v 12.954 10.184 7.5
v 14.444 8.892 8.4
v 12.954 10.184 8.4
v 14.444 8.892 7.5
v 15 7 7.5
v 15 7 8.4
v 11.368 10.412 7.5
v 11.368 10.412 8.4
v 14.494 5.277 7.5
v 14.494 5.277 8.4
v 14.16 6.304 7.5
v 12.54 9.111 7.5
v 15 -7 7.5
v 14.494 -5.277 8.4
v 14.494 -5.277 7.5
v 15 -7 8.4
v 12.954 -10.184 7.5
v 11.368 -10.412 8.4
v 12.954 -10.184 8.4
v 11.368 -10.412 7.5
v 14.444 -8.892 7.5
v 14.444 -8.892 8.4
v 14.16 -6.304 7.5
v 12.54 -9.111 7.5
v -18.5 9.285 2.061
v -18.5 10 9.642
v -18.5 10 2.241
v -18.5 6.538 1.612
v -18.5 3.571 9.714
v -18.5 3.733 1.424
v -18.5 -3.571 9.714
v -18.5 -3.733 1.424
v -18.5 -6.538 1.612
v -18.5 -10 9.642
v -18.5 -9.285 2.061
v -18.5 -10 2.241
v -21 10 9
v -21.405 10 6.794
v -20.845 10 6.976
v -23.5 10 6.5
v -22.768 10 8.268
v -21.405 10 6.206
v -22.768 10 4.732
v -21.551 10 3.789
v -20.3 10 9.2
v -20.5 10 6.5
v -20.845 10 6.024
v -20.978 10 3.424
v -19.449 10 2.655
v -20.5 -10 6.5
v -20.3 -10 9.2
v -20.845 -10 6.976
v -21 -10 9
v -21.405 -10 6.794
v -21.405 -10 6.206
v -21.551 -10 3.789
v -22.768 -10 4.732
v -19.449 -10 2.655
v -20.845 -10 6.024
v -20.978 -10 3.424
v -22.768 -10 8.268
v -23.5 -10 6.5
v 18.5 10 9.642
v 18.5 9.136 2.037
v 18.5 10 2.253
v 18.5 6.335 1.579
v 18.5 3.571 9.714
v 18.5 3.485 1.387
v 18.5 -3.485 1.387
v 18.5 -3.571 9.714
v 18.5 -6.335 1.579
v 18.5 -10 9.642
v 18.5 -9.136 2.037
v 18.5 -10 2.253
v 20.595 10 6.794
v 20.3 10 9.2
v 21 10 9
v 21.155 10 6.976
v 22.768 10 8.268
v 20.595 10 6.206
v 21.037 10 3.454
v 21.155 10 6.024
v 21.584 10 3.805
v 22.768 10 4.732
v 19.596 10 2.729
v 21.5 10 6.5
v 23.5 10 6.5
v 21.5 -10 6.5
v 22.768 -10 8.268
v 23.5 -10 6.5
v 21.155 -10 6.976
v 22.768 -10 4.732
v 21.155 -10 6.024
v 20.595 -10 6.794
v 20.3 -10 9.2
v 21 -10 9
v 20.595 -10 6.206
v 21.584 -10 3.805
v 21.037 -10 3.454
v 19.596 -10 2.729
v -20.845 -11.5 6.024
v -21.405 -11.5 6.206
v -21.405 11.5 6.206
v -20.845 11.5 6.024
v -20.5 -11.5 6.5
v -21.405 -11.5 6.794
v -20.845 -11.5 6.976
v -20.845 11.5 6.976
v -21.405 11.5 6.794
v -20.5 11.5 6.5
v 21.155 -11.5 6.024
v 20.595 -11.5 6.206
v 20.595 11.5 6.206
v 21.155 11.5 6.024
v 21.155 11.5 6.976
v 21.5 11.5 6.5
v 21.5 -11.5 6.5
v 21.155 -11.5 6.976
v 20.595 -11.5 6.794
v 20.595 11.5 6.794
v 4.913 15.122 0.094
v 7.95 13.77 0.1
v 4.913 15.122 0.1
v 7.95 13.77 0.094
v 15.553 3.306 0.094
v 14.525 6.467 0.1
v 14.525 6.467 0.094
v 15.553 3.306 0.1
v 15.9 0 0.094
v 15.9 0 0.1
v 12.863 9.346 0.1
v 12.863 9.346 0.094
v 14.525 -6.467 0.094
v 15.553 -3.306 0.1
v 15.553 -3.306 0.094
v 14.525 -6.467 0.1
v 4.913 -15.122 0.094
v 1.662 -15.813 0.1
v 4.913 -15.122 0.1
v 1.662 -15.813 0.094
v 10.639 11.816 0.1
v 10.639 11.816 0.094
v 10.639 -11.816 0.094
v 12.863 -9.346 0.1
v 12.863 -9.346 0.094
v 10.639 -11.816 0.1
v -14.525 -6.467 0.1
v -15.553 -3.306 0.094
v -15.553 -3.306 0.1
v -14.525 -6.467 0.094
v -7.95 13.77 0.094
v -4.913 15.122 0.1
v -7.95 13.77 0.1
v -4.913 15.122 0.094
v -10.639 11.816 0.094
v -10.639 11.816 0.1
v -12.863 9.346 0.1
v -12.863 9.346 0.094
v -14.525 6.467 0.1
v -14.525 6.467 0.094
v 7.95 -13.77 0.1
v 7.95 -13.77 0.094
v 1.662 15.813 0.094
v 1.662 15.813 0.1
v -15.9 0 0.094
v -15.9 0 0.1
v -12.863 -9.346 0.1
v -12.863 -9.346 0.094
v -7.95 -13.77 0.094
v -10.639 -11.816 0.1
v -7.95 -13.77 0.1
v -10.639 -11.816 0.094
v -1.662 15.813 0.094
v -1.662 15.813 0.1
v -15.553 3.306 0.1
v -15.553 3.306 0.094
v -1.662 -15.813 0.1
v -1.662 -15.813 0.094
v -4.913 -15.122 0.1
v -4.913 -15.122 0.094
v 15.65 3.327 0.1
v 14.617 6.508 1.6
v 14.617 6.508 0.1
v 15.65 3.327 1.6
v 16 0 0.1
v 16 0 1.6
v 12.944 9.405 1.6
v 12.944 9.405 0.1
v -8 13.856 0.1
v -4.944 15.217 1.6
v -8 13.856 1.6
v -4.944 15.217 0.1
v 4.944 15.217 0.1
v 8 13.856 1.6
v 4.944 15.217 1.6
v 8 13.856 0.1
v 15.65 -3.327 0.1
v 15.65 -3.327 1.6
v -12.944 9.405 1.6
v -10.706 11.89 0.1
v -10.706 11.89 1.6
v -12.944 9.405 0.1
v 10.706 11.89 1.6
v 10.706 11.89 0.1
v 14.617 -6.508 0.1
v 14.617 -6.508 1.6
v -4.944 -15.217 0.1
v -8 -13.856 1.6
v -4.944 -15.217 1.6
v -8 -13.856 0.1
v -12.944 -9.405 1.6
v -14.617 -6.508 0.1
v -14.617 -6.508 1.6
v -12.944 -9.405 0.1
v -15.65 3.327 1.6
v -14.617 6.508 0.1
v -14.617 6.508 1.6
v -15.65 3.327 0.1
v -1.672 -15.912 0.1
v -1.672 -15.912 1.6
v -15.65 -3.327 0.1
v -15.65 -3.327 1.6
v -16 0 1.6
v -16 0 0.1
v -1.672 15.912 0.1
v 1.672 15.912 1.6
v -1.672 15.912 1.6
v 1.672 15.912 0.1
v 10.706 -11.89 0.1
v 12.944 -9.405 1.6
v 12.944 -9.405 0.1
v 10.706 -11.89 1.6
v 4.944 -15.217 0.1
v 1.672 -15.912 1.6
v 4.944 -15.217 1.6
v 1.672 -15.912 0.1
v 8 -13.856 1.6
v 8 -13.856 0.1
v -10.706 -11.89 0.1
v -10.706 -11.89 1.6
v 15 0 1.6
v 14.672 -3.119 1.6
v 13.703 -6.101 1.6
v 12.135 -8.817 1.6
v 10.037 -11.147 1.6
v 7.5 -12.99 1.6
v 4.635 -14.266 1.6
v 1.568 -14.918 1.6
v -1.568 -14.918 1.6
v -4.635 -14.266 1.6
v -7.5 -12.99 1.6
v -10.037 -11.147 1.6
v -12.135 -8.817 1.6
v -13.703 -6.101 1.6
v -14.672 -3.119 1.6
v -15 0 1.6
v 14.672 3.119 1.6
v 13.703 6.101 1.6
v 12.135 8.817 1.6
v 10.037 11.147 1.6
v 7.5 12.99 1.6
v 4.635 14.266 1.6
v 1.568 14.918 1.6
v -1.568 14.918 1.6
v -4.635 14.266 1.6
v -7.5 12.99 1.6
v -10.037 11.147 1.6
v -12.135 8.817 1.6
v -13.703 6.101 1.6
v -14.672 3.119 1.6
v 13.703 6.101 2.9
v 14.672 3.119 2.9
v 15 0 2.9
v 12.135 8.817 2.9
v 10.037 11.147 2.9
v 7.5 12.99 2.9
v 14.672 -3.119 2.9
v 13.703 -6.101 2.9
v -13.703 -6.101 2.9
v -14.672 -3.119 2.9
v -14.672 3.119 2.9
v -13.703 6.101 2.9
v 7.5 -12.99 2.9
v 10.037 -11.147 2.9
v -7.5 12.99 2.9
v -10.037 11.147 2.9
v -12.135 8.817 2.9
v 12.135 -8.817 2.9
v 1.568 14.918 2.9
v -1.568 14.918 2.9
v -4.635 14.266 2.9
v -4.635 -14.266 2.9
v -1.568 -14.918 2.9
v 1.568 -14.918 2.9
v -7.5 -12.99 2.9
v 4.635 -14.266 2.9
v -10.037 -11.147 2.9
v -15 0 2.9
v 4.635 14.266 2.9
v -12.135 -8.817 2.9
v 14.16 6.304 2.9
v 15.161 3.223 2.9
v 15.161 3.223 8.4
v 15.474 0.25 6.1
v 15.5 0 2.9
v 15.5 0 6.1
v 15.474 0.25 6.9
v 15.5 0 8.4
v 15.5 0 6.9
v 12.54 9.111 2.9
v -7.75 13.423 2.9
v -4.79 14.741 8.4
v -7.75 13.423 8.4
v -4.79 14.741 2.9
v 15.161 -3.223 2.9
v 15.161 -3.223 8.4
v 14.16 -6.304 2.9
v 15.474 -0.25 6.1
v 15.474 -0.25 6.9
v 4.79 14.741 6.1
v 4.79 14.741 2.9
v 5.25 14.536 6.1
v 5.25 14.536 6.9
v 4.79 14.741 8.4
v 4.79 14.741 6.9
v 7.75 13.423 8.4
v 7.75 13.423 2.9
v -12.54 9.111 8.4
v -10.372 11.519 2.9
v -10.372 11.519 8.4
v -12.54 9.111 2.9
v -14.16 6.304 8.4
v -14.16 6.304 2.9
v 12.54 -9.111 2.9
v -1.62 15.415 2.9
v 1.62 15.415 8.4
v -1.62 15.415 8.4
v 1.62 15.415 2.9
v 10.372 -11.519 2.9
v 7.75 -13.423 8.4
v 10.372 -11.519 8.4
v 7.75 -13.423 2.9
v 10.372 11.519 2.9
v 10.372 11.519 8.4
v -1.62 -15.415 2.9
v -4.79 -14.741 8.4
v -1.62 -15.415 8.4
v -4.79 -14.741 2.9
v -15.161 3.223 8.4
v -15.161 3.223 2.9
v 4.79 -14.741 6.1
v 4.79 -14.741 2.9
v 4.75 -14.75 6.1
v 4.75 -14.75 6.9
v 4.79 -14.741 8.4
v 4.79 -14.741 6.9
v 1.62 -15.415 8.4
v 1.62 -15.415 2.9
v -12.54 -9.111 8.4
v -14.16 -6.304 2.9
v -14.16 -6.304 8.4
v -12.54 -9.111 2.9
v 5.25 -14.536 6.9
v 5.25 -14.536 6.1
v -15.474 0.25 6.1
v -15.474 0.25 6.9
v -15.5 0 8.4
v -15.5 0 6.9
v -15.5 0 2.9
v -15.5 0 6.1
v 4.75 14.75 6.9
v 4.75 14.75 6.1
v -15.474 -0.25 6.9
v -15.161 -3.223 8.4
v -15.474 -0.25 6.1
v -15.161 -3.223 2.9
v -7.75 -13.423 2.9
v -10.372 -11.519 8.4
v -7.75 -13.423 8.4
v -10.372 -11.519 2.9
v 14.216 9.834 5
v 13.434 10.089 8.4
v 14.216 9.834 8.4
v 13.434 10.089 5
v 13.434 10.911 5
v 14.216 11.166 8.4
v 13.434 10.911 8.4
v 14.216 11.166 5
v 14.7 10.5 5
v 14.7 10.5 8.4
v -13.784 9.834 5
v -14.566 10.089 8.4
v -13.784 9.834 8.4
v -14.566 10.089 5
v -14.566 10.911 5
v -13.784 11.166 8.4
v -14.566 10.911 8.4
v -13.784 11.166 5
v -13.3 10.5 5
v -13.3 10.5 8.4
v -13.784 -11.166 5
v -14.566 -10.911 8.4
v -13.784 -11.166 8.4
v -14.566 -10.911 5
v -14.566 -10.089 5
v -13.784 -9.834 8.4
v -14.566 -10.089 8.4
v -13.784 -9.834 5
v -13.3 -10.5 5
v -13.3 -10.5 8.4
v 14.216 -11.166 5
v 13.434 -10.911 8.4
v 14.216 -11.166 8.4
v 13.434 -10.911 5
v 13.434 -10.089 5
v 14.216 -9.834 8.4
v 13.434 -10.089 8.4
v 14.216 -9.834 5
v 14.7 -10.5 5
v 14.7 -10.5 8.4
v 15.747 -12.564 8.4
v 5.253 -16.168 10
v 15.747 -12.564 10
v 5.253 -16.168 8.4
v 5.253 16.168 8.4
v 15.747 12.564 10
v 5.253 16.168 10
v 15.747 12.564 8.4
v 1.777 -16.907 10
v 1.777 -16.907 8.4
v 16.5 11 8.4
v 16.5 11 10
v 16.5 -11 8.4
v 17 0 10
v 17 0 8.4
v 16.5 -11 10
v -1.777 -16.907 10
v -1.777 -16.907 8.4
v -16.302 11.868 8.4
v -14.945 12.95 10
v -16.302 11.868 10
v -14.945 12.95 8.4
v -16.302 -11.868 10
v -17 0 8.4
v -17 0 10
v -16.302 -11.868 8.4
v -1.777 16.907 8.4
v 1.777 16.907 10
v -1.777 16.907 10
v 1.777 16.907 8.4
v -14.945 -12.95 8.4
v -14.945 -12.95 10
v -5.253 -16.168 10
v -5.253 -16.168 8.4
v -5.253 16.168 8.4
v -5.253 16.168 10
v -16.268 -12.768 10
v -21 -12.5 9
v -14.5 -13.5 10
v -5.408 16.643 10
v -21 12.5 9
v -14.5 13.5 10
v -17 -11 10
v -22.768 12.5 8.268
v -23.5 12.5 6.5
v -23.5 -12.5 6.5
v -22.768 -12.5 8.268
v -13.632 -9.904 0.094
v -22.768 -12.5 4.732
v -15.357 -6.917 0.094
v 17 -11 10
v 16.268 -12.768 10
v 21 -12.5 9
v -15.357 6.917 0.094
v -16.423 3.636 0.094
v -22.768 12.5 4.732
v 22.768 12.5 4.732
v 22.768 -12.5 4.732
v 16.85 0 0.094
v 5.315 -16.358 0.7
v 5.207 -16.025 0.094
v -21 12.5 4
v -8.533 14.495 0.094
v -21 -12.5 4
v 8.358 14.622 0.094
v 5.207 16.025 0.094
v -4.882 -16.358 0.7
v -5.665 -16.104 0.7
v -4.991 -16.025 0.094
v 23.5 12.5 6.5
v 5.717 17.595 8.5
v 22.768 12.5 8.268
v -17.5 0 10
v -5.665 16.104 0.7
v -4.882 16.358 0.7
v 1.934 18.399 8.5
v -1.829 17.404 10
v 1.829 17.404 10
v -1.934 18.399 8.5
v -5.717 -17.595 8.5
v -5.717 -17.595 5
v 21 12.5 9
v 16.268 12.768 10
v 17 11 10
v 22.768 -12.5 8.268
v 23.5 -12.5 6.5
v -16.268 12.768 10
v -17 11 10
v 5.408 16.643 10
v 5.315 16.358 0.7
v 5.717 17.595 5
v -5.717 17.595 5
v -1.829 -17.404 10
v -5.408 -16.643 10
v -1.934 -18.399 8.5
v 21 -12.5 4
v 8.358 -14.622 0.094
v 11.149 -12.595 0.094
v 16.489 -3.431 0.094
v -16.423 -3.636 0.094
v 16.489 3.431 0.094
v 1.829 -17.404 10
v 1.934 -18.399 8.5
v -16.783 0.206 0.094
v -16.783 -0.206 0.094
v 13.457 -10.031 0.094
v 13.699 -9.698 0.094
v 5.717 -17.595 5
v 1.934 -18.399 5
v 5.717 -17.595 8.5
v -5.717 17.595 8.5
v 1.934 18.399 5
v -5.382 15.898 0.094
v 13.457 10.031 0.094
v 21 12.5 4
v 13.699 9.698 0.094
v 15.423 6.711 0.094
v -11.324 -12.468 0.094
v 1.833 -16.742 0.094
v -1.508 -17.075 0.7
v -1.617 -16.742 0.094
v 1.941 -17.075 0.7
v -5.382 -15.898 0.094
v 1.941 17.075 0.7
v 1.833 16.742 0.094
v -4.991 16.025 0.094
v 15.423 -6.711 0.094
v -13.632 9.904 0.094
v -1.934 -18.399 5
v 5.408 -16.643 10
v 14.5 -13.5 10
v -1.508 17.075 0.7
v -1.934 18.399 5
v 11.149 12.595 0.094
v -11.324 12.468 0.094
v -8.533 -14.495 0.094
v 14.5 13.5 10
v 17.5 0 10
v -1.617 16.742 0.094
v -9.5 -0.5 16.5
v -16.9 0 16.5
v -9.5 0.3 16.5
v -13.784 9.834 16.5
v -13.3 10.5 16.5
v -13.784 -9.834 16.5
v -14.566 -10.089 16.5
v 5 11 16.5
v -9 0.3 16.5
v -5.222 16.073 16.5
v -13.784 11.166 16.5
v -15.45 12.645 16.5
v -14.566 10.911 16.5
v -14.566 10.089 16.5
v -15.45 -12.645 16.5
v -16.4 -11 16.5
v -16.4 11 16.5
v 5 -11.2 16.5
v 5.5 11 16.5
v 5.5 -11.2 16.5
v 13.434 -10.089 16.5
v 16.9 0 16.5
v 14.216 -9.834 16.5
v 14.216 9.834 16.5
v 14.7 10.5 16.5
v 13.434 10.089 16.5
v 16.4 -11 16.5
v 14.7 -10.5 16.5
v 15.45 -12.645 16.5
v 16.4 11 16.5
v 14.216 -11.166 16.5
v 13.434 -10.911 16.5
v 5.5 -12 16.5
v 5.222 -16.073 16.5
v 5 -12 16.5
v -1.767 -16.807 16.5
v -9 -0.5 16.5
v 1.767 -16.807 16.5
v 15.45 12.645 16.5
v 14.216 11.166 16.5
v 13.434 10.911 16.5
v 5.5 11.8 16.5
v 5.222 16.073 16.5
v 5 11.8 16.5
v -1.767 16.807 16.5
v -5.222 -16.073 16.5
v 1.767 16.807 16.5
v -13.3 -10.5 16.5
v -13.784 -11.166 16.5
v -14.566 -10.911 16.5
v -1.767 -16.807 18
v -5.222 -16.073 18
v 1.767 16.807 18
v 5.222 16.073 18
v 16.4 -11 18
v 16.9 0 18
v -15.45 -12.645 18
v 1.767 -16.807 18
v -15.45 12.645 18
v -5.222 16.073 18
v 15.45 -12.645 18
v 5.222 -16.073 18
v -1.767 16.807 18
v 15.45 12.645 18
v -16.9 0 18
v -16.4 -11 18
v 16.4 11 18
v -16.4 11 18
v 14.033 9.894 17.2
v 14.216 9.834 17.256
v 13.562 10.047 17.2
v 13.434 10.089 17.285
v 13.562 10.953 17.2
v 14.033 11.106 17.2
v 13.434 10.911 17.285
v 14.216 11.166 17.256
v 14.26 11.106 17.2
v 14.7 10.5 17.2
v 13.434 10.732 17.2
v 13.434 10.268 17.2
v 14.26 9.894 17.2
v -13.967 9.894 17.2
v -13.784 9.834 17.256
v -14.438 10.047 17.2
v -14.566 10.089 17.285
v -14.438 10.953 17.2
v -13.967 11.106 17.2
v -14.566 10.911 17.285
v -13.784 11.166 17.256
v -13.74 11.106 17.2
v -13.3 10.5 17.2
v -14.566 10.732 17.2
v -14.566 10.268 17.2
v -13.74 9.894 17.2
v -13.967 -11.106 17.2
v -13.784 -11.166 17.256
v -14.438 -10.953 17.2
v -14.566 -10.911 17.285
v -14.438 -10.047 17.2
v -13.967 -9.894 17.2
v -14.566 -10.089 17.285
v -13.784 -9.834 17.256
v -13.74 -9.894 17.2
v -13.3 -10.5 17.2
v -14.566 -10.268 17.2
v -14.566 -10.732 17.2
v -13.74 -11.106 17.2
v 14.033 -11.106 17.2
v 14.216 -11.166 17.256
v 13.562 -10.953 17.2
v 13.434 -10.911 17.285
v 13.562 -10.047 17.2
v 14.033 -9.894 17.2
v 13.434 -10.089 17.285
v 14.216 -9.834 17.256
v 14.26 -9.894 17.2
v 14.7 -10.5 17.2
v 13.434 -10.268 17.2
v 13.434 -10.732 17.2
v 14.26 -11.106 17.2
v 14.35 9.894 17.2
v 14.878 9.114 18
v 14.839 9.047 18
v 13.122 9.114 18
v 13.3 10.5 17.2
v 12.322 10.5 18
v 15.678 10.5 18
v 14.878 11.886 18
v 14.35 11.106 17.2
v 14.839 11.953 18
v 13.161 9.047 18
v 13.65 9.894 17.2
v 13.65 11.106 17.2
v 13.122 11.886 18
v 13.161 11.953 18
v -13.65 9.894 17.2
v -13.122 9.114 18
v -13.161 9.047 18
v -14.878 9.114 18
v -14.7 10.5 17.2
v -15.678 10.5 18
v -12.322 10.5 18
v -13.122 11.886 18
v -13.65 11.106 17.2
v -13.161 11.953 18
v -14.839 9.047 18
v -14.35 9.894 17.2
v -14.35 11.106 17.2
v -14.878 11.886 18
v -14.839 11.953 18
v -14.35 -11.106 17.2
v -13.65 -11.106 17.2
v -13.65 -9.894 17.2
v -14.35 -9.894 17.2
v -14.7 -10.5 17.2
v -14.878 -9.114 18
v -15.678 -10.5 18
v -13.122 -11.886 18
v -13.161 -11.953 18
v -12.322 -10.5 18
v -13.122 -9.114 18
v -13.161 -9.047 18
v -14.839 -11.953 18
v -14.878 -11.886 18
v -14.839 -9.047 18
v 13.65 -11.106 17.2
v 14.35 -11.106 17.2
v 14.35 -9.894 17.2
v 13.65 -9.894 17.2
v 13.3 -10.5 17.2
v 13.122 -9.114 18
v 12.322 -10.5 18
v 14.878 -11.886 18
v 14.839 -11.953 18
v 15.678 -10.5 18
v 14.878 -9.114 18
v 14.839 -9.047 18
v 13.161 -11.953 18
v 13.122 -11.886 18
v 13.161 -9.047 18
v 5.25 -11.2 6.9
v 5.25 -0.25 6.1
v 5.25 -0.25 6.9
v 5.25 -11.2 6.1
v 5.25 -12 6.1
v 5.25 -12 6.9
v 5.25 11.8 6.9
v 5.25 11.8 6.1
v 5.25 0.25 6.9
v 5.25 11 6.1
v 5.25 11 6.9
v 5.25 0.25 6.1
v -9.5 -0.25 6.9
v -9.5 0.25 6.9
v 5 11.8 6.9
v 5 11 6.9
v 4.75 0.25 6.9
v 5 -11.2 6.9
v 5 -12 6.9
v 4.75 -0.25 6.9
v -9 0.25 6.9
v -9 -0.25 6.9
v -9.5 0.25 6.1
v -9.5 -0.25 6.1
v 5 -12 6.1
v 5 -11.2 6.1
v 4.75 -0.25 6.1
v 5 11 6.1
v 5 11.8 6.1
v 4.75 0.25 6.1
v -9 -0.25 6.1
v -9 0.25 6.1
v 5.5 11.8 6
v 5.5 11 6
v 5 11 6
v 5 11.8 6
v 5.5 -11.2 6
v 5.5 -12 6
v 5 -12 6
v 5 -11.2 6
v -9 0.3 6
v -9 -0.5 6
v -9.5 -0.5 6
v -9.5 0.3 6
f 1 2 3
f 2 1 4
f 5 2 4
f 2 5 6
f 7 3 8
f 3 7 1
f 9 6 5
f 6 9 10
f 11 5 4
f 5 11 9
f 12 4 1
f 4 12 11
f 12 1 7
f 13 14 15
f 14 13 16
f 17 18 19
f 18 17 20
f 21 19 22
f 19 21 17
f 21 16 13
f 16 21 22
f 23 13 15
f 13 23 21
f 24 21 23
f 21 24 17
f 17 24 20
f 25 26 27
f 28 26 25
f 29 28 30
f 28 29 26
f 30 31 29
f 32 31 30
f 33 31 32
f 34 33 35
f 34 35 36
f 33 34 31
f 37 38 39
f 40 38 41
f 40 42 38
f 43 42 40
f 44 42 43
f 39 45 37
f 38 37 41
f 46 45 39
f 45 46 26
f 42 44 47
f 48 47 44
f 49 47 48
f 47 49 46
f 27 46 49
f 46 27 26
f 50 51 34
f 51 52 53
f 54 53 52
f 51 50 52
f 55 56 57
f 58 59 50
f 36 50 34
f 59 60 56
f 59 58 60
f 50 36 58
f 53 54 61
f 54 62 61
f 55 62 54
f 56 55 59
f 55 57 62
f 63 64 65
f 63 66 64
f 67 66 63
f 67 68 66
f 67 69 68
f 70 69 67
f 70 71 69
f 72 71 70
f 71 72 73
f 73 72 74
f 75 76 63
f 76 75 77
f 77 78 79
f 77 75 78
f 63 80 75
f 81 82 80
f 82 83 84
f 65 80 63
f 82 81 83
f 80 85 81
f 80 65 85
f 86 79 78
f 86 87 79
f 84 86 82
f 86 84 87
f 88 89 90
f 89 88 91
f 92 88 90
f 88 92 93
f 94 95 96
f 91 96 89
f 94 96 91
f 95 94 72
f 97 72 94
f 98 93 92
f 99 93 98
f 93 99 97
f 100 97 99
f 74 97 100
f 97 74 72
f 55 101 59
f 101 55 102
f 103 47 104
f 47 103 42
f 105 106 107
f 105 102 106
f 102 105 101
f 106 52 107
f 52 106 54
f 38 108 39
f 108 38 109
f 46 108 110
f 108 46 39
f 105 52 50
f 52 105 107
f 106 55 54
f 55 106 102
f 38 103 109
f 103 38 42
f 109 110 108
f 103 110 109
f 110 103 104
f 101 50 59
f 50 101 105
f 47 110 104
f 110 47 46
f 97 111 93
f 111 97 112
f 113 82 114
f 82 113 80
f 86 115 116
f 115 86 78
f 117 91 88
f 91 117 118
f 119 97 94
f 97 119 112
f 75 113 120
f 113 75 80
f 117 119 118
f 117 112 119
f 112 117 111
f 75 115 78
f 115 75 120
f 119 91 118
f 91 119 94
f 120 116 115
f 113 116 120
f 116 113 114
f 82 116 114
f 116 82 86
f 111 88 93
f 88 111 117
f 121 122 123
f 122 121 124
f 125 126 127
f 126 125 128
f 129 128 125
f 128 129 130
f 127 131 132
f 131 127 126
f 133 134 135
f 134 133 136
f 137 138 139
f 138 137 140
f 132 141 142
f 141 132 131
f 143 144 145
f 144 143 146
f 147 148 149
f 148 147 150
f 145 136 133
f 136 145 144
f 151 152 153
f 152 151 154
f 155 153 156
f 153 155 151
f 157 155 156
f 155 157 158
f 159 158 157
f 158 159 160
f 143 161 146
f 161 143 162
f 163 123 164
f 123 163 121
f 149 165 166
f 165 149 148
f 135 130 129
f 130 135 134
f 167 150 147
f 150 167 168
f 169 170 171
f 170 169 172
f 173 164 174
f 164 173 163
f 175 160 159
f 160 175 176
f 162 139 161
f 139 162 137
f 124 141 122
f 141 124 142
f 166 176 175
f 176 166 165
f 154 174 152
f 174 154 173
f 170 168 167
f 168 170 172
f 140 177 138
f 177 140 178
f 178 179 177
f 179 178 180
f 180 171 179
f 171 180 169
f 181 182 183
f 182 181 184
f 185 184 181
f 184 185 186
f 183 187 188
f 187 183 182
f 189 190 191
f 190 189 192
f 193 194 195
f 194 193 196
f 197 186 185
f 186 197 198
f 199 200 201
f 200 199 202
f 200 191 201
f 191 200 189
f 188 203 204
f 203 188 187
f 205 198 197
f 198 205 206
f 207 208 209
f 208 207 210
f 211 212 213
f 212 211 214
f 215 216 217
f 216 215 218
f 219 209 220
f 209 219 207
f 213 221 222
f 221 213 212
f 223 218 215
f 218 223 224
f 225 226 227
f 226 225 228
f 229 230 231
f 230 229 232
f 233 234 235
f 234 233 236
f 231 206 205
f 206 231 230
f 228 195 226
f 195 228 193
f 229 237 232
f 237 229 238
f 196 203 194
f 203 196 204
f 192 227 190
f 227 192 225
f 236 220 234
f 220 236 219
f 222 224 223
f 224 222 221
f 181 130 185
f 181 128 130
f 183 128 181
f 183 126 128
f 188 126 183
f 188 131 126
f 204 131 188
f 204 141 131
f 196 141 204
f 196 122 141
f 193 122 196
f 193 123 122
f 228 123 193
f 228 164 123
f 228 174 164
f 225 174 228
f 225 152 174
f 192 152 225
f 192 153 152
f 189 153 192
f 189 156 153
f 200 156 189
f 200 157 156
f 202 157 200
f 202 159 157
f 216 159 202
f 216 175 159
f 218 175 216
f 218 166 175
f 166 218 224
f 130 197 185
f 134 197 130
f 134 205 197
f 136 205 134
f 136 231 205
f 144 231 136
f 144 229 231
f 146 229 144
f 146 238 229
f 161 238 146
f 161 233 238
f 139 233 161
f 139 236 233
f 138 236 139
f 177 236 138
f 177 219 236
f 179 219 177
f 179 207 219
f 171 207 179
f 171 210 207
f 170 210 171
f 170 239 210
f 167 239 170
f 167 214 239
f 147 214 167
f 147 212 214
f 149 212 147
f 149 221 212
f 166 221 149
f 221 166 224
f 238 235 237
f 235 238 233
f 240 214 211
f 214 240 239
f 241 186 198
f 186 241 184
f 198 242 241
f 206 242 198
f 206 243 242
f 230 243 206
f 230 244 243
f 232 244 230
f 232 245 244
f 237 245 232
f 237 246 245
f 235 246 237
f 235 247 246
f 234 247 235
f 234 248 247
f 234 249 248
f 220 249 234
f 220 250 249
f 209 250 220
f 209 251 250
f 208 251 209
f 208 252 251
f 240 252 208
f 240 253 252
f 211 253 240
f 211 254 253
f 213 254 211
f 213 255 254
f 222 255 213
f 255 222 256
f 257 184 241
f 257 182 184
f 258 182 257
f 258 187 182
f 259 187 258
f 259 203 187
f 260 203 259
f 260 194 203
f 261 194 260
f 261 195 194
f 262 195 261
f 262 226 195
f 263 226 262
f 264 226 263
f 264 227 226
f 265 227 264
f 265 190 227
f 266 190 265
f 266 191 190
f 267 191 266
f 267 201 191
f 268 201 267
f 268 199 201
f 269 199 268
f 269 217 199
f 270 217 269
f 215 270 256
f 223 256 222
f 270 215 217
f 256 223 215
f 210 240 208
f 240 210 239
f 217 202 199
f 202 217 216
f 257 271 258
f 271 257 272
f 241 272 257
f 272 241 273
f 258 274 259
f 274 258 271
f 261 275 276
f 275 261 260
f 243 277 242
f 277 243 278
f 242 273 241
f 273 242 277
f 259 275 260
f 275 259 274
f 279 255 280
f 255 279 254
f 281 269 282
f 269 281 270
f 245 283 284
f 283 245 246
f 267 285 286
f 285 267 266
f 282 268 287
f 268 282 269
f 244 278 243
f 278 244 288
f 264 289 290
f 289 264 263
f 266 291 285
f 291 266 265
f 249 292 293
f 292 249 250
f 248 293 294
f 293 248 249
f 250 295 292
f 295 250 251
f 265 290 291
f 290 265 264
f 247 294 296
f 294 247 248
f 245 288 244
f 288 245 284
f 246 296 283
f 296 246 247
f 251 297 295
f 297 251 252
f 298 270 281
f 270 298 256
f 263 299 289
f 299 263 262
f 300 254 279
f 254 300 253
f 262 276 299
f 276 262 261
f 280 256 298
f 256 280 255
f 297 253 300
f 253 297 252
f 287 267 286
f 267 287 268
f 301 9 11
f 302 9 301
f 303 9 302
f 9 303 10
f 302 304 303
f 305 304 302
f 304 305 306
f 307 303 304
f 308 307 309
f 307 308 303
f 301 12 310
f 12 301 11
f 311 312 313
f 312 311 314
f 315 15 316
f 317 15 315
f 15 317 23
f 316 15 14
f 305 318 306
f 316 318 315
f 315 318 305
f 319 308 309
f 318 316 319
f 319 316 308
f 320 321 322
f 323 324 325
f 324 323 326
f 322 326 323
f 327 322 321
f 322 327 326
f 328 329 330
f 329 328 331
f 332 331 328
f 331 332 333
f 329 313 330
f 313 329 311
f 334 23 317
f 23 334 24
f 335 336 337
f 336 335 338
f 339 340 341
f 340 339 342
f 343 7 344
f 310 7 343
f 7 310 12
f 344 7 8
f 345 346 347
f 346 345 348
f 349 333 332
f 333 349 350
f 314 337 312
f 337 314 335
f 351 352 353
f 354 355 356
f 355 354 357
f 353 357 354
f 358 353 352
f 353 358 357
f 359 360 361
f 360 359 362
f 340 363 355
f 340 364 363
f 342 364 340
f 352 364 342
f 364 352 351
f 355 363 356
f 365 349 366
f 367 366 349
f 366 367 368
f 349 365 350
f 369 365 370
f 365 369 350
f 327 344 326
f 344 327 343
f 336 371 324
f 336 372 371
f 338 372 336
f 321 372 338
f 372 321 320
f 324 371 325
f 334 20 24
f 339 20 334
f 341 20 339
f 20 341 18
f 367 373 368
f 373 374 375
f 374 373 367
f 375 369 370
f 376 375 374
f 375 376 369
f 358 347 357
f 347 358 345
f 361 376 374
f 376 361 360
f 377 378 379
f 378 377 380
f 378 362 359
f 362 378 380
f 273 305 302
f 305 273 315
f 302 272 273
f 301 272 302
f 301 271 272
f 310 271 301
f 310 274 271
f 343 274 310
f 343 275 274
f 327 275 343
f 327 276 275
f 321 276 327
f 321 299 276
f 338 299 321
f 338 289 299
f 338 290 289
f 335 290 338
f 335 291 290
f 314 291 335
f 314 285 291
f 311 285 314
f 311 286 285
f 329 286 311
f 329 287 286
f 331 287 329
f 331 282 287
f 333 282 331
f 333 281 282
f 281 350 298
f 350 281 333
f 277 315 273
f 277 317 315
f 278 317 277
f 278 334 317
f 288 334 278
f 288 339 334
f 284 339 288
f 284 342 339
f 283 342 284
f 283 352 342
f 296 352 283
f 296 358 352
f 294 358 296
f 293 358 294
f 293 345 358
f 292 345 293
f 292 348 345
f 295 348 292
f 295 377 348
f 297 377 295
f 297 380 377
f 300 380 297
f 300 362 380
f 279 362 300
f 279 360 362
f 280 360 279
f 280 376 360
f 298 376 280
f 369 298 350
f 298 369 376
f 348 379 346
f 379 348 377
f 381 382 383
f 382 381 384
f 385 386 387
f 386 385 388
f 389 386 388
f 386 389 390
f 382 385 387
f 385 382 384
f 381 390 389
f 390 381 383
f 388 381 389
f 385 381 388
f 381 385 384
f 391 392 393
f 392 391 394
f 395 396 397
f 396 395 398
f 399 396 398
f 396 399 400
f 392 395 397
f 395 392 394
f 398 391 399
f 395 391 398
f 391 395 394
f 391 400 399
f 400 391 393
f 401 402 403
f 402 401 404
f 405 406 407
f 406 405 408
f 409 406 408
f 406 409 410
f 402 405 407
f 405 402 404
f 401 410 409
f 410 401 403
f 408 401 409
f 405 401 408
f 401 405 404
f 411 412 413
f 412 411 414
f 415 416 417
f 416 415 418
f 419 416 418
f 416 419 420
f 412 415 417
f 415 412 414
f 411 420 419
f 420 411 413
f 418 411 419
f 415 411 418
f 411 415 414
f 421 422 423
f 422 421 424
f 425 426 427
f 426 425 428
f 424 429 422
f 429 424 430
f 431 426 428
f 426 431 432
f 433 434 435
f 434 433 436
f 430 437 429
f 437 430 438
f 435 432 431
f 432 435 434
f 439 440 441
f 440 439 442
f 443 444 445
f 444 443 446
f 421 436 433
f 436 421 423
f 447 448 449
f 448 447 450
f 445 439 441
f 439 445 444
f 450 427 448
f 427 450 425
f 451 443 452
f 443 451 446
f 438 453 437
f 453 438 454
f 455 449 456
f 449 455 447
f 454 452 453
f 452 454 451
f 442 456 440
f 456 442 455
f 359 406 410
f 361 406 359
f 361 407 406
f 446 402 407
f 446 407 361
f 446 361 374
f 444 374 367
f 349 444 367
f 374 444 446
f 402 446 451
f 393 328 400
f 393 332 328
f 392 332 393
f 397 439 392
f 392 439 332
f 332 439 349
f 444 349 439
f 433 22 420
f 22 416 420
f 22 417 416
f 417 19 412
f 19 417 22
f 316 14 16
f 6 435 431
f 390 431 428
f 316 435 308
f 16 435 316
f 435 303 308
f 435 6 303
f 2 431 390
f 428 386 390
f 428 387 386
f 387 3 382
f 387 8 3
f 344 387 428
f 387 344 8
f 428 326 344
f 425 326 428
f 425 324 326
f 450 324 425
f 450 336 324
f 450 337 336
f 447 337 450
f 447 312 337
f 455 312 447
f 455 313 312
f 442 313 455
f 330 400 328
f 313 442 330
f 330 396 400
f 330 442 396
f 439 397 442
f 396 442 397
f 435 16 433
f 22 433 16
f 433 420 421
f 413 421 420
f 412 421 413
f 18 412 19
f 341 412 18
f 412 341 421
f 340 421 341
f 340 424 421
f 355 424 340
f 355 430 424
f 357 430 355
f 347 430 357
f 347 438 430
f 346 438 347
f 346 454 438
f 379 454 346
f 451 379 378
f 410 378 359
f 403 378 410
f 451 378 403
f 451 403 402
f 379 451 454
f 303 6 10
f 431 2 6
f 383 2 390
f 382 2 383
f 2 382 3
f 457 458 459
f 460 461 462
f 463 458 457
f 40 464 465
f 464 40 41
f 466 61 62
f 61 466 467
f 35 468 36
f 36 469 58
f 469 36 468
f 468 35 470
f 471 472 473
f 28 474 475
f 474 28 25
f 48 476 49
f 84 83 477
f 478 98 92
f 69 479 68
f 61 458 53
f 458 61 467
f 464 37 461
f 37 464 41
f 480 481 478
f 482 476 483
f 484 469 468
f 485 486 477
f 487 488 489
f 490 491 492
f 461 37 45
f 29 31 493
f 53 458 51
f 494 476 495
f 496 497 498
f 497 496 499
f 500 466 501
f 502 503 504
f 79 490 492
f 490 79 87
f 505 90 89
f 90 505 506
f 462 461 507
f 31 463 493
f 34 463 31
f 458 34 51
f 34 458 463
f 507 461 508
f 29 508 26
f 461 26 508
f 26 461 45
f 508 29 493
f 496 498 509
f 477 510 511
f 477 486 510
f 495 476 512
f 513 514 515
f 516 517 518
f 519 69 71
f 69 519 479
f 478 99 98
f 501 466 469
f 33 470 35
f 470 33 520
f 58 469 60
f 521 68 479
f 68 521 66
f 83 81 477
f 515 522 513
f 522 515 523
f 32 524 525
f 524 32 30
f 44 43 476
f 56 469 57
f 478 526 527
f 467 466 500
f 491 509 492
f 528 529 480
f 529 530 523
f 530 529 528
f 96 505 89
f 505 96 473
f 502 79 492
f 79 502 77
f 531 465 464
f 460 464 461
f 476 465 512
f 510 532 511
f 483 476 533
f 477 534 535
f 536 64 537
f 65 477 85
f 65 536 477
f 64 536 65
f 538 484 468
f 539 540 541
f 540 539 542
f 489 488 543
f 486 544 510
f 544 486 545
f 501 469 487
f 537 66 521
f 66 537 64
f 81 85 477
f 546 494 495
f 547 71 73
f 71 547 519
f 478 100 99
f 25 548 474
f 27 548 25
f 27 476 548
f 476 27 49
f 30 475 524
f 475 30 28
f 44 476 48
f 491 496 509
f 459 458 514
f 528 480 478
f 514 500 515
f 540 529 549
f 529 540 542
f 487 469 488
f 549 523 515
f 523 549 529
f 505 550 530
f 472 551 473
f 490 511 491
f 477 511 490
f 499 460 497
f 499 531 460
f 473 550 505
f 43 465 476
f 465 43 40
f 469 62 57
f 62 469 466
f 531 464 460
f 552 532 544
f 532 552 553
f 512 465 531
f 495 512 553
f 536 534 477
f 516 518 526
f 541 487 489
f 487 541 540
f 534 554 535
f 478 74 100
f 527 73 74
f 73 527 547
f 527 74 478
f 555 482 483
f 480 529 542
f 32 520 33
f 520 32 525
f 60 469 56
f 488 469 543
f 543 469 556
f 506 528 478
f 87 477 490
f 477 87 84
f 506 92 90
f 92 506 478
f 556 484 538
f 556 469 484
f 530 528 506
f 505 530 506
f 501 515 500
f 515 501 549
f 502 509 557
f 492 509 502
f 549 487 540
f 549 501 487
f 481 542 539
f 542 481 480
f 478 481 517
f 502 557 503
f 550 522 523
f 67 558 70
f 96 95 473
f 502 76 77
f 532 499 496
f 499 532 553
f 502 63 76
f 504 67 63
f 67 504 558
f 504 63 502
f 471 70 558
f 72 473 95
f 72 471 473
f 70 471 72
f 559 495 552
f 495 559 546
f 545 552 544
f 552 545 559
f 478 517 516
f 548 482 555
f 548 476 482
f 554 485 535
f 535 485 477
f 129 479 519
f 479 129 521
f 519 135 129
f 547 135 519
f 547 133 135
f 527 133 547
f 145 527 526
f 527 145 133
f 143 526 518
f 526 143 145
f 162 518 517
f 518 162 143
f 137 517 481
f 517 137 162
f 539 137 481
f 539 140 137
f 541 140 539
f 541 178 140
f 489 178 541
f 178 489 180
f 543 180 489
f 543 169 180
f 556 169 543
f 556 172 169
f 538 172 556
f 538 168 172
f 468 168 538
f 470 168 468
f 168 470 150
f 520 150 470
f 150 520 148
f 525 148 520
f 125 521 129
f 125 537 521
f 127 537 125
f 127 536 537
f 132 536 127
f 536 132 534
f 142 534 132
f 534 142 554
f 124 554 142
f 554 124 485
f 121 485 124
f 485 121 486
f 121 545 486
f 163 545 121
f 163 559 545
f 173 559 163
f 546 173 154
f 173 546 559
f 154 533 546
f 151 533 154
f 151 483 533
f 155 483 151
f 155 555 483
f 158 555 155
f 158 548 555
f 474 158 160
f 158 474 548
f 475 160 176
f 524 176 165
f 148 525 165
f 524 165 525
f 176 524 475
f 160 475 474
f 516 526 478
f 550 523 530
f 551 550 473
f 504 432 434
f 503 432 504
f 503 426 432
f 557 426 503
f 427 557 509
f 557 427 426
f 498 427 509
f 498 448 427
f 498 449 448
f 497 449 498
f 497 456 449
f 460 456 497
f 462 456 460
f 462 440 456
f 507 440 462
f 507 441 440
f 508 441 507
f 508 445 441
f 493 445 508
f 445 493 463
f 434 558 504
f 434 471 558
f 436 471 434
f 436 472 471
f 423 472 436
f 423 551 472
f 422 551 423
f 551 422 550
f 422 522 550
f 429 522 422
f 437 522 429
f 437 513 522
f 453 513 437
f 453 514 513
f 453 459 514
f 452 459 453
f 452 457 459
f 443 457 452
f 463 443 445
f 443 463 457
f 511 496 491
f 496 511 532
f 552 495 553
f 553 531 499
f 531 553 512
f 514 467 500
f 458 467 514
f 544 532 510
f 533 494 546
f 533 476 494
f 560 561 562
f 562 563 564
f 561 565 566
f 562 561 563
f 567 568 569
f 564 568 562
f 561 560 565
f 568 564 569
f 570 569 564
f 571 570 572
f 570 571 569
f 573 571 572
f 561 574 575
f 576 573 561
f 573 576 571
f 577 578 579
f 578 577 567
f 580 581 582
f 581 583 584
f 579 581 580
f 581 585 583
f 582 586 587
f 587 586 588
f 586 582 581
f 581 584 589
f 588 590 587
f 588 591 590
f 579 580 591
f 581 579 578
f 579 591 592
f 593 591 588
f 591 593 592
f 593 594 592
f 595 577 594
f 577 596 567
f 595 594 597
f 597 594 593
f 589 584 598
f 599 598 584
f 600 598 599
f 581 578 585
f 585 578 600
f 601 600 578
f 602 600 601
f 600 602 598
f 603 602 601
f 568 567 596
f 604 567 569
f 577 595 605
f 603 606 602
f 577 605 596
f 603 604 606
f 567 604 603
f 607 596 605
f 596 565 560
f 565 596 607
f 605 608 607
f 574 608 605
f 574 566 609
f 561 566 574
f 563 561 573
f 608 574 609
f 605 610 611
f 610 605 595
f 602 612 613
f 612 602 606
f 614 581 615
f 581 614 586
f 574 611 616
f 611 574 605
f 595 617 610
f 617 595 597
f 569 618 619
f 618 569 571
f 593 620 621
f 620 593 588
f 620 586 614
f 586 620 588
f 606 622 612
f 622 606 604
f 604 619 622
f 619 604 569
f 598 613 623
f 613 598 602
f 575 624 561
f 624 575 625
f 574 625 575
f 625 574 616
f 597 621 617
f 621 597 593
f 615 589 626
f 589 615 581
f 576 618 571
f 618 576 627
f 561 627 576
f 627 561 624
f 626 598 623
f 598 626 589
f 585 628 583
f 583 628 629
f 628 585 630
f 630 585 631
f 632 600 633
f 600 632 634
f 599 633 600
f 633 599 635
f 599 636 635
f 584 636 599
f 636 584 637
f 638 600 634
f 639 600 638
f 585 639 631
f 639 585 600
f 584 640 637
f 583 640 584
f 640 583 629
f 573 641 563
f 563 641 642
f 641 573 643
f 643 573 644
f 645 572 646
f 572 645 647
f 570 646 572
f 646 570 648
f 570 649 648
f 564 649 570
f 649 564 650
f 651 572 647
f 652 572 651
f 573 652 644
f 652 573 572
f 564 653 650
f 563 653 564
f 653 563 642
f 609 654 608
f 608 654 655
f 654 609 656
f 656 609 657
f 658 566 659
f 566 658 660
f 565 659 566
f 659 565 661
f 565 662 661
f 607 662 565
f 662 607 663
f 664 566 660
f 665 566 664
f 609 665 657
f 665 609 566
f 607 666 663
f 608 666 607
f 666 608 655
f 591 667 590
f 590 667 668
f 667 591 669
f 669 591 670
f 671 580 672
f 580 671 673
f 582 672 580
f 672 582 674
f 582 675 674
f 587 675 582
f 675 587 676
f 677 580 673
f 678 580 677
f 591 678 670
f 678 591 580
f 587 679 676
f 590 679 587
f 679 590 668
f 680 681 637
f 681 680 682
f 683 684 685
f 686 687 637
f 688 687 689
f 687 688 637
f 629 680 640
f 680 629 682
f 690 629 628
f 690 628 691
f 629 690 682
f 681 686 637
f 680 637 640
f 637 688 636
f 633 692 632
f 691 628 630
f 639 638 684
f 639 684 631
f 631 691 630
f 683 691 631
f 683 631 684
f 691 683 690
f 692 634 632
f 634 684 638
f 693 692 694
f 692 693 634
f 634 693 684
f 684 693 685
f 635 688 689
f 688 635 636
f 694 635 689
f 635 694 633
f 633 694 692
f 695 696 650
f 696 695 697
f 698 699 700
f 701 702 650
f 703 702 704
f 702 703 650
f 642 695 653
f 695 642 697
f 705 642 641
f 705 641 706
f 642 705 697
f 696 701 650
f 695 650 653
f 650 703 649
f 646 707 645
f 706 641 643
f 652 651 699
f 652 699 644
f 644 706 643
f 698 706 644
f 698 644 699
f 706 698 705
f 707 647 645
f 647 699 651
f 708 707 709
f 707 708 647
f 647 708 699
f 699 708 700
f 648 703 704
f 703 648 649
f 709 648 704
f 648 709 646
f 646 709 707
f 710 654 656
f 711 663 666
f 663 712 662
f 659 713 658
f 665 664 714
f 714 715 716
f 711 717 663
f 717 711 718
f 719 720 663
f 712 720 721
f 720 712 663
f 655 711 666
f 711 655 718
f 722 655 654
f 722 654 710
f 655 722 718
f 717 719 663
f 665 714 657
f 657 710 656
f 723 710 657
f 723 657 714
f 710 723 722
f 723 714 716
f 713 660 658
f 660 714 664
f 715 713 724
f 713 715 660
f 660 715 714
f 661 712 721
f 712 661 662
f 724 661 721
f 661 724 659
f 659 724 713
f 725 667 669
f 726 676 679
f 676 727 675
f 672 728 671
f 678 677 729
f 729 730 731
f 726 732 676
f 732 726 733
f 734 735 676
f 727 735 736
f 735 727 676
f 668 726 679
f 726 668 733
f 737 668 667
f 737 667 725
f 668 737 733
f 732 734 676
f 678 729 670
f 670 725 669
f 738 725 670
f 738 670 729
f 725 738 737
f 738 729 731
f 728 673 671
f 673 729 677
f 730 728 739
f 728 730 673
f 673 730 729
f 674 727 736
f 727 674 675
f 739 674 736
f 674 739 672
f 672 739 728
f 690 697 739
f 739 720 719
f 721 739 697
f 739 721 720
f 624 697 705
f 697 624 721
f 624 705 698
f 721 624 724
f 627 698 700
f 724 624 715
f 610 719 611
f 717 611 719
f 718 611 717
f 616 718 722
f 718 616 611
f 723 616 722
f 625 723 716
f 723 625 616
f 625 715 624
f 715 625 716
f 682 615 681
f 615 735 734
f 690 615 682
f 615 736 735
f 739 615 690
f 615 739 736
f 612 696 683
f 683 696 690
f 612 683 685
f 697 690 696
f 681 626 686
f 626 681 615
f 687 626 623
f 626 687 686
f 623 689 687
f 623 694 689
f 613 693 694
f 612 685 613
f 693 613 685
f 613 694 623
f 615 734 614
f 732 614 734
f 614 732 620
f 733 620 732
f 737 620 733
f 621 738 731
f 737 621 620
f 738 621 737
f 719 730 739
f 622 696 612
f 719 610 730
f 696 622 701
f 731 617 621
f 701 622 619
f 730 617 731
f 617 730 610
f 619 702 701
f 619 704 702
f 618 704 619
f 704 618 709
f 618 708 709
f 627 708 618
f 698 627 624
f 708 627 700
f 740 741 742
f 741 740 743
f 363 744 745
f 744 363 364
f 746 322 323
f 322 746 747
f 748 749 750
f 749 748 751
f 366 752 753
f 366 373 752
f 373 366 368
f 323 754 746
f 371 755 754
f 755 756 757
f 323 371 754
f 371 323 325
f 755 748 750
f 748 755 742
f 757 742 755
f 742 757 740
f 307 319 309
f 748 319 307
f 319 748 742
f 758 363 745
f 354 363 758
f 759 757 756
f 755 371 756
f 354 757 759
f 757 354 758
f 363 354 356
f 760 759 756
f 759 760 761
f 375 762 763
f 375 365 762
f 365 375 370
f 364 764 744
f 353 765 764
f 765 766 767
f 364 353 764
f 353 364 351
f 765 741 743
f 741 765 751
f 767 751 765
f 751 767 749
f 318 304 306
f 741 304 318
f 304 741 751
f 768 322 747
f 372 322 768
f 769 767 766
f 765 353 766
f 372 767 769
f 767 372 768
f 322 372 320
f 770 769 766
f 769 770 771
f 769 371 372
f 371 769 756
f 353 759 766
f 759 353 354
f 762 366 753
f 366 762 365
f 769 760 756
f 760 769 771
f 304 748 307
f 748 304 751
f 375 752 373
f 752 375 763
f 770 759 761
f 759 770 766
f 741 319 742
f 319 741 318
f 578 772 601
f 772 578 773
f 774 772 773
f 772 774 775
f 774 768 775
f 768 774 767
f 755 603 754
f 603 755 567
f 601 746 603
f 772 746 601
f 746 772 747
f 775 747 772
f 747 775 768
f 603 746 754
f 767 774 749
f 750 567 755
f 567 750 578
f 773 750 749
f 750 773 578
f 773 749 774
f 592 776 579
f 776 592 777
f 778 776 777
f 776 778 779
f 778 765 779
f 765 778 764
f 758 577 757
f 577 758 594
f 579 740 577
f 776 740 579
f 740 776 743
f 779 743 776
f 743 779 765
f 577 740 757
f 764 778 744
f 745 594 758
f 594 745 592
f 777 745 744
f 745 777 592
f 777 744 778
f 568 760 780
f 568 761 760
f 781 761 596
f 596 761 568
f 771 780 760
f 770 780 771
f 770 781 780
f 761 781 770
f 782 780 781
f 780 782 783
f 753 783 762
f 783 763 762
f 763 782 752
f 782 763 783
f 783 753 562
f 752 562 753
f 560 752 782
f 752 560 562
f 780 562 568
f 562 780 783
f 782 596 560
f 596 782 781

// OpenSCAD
// CSG.scad - Basic example of CSG usage

ClockHeight = 10;
module housingBody(_height,inside,lid){
    glassClamp = 0.1;
    glassSize = 1.5;
    PCBSize = 1.6;
    PCBFrontKeepout = 1.4;
    PCBBackKeepout = 3.9;
    LIDSize=1.5;
    height=glassClamp+glassSize+PCBSize+PCBFrontKeepout+PCBBackKeepout+LIDSize;
    echo("checking ig the requested Size is met");
    assert(_height==height);
    
    
    mHx=14.;
    mHy=10.5;
    
        if (inside)
        {
            //space for wrist strap
            translate([-43.5+5,-10,0])scale([20,20,height+5])cube(1);
            translate([23.5-5,-10,0])scale([20,20,height+5])cube(1);
            
            translate([-21,11.5,height-3.5]) {//holes for Mounting
                
                rotate(a=[90,0,0])cylinder(23,0.5,0.5);
            }
            translate([21,11.5,height-3.5]) {//holes for Mounting
                rotate(a=[90,0,0])cylinder(23,0.5,0.5);
            }
            
            
            translate([0,0,-1])cylinder(glassClamp+1.1,15.9,15.9);//glass Clamp
            translate([0,0,glassClamp])cylinder(glassSize,16,16);//glass
            cylinder(height+2,15,15);//mounted parts
            translate([0,0,glassSize+PCBFrontKeepout]) {//PCB Mounting
                cylinder(height,15.5,15.5);
            }
            /*
            translate([-2,20,glassSize+PCBFrontKeepout+PCBSize+2.3]) {//Holes for buttons
                rotate(a=[90,0,0])
                {
                    
                    cylinder(40,1.5,1.5);
                    translate([0,0,3])
                    {
                        cylinder(34,2.4,2.4);
                    }
                }
            }
            */
            translate([mHx,mHy,height-5]) {
                cylinder(6,0.7,0.7);
            }
            translate([-mHx,mHy,height-5]) {
                cylinder(6,0.7,0.7);
            }
            translate([-mHx,-mHy,height-5]) {
                cylinder(6,0.7,0.7);
            }
            translate([mHx,-mHy,height-5]) {
                cylinder(6,0.7,0.7);
            }
            //translate([0,0,height+3-LIDSize])scale([37.1,40,6])cube(1,center=true);
            translate([0,0,height-LIDSize-1]){
                //cylinder(6,18,18);
                translate([11.5,7,0])cylinder(1,3.5,3.5);
                translate([11.5,-7,0])cylinder(1,3.5,3.5);
            }
            translate([0,0,height-LIDSize-0.1])hull()
            {
                cylinder(6,17,17);
                //translate([-14.5,-11,0]) {
                //    cylinder(6,3,3);
                //}
                translate([14.5,11,0]) {
                    cylinder(6,2,2);
                }
                translate([-14.5,11,0]) {
                    cylinder(6,2,2);
                }
                translate([-14.5,-11,0]) {
                    cylinder(6,2,2);
                }
                translate([14.5,-11,0]) {
                    cylinder(6,2,2);
                }
                //cylinder(6,16,16);
            }
        }
        else
        {
            difference(){
                hull()
                union(){
                    //translate([0,0,height-1])scale([47,25,2])cube(1, center=true);
                    minkowski(){
                        translate([0,0,0.7])cylinder(5-0.7,16.5,17.8);
                        sphere(0.7);
                    }
                    translate([0,0,5])cylinder(height-5-LIDSize,18.5,18.5);
                    translate([0,0,height-LIDSize])cylinder(LIDSize,18.5,17.5);
                    translate([-21,12.5,height-3.5]) {//wrist smoothing
                        rotate(a=[90,0,0])
                        {
                            cylinder(25,2.5,2.5);
                        }
                    }
                    translate([21,12.5,height-3.5]) {//wrist smoothing
                        rotate(a=[90,0,0])
                        {
                            cylinder(25,2.5,2.5);
                        }
                    }
                    translate([14.5,11,height-LIDSize]) {
                        cylinder(LIDSize,2.5,2.5);
                    }
                    translate([-14.5,11,height-LIDSize]) {
                        cylinder(LIDSize,2.5,2.5);
                    }
                    translate([-14.5,-11,height-LIDSize]) {
                        cylinder(LIDSize,2.5,2.5);
                    }
                    translate([14.5,-11,height-LIDSize]) {
                        cylinder(LIDSize,2.5,2.5);
                    }
                }
                if(lid)
                {
                    union()
                    {   
                        difference(){
                            cube(100,center=true);
                            //translate([0,0,height+3-LIDSize+0.1])scale([36.9,40,6])cube(1,center=true);
                            //translate([0,0,height-LIDSize+0.1])cylinder(LIDSize-1,15.4,15.4);
                            translate([0,0,height-LIDSize])hull()
                            {
                                cylinder(6,16.9,16.9);
                                //translate([-14.5,-11,0]) {
                                //    cylinder(6,3,3);
                                //}
                                translate([14.5,11,0]) {
                                    cylinder(6,1.9,1.9);
                                }
                                translate([-14.5,11,0]) {
                                    cylinder(6,1.9,1.9);
                                }
                                translate([-14.5,-11,0]) {
                                    cylinder(6,1.9,1.9);
                                }
                                translate([14.5,-11,0]) {
                                    cylinder(6,1.9,1.9);
                                }
                                //cylinder(6,16,16);
                            }
                        }
                        translate([mHx,mHy,height-6]) {
                            cylinder(9,0.7,0.7);
                        }
                        translate([-mHx,mHy,height-6]) {
                            cylinder(9,0.7,0.7);
                        }
                        translate([-mHx,-mHy,height-6]) {
                            cylinder(9,0.7,0.7);
                        }
                        translate([mHx,-mHy,height-6]) {
                            cylinder(9,0.7,0.7);
                        }
                        translate([mHx,mHy,height-0.8]) {
                            cylinder(0.9,0.7,1.8);
                        }
                        translate([-mHx,mHy,height-0.8]) {
                            cylinder(0.9,0.7,1.8);
                        }
                        translate([-mHx,-mHy,height-0.8]) {
                            cylinder(0.9,0.7,1.8);
                        }
                        translate([mHx,-mHy,height-0.8]) {
                            cylinder(0.9,0.7,1.8);
                        }
                        /*
                        translate([-2,20,glassSize+PCBFrontKeepout+PCBSize+2.3]) {//Holes for buttons
                            rotate(a=[90,0,0])
                            {
                                
                                cylinder(40,1.5,1.5);
                                translate([0,0,3])
                                {
                                    translate([0,0,0])cylinder(6,2.5,2.5);
                                    translate([0,0,28])cylinder(6,2.5,2.5); 
                                }
                            }
                        }*/
                    }
                }
            }
        }
     echo("Housing Size is ");
     echo(height);
}
module button(){
    color([0,0,0])rotate([180,0,0])
    {
        cylinder(5,1.4,1.4);
        cylinder(0.8,2.2,2.2);
    }
}

module pcb(){
    color([0,0,0]) cylinder(1,15.5,15.5);
    translate([5,0,1])cylinder(3.9,10,10);
    translate([-9,0,-0.5])scale([5,5,1])cube(1,center=true);
    translate([-3,0,-0.5])scale([1.2,1.8,1])cube(1,center=true);
    translate([-3,4,-0.5])scale([0.8,1.6,1])cube(1,center=true);
    translate([-3,-4,-0.5])scale([0.8,1.6,1])cube(1,center=true);
    color([1,0,0]){
        translate([0,-3,-0.5])scale([0.8,1.6,1])cube(1,center=true);
        translate([0,3,-0.5])scale([0.8,1.6,1])cube(1,center=true);
        translate([0,8,-0.5])scale([0.8,1.6,1])cube(1,center=true);
        translate([0,-8,-0.5])scale([0.8,1.6,1])cube(1,center=true);
        
        translate([3,-3,-0.5])scale([0.8,1.6,1])cube(1,center=true);
        translate([3,3,-0.5])scale([0.8,1.6,1])cube(1,center=true);
        translate([3,8,-0.5])scale([0.8,1.6,1])cube(1,center=true);
        translate([3,-8,-0.5])scale([0.8,1.6,1])cube(1,center=true);
        
        translate([6,-3,-0.5])scale([0.8,1.6,1])cube(1,center=true);
        translate([6,3,-0.5])scale([0.8,1.6,1])cube(1,center=true);
        translate([6,8,-0.5])scale([0.8,1.6,1])cube(1,center=true);
        translate([6,-8,-0.5])scale([0.8,1.6,1])cube(1,center=true);
        
        translate([9,-3,-0.5])scale([0.8,1.6,1])cube(1,center=true);
        translate([9,3,-0.5])scale([0.8,1.6,1])cube(1,center=true);
        translate([9,8,-0.5])scale([0.8,1.6,1])cube(1,center=true);
        translate([9,-8,-0.5])scale([0.8,1.6,1])cube(1,center=true);
    }
    translate([5,11.7,1.4])scale([5.1,3,0.5])cube(1,center=true);
    translate([5,-11.7,1.4])scale([5.1,3,0.5])cube(1,center=true);
    
    translate([-2,12.5,1.4])scale([6.4,3.5,1.4])cube(1,center=true);
    color([0,0,1])translate([-2,12.7,1.4])scale([2.6,4.5,2.4])cube(1,center=true);
    translate([-2,-12.5,1.4])scale([6.4,3.5,1.4])cube(1,center=true);
    color([0,0,1])translate([-2,-12.7,1.4])scale([2.6,4.5,2.4])cube(1,center=true);
}
module housingBodyAll(height){
    difference()
    {
        housingBody(height,false);
        housingBody(height,true);
    }
}
//$fs=0.05;
//$fa=5;
module printall(){
    
    housingBodyAll(ClockHeight);
    translate([0,0,8])housingBody(ClockHeight,false,true);
    //translate([0,0,20.7])pcb();
    //translate([5,7,6.1])rotate([180,0,0])button();
    //translate([5,-7,6.1])rotate([180,0,0])button();
    translate([5,0,6.5])scale([0.5,35,0.8])cube(1,center=true);
    translate([0,0,6.5])scale([32,0.5,0.8])cube(1,center=true);
    translate([5,11,6.0])scale([0.5,0.8,12])cube(1);
    translate([5,-12,6.0])scale([0.5,0.8,12])cube(1);
    translate([-9.5,-0.5,6.0])scale([0.5,0.8,12])cube(1);

}
module printSLASideBySide(){
    
    translate([0,0,ClockHeight])rotate([180,0,0])housingBodyAll(ClockHeight);
    translate([0,37,-ClockHeight+1.5])housingBody(ClockHeight,false,true);
    //translate([0,0,20.7])pcb();
    //translate([5,7,0])rotate([180,0,0])button();
    //translate([5,-7,0])rotate([180,0,0])button();
}

module rendering()
{
    //$fs=0.05;
    //$fa=5;

    housingBodyAll(ClockHeight);
    housingBody(ClockHeight,false,true);
    //translate([0,0,-15])housingBody(10,false,true);
    translate([0,0,2.8])pcb();
    //translate([-2,15,6.1])rotate([90,0,0])button();
    //translate([-2,-15,6.1])rotate([-90,0,0])button();
}
printall();

//rendering();
//printSLASideBySide();
//translate([0,0,0])housingBody(10,false);
//translate([0,0,10])lid();
//for Debugging
//housingBodyAll(ClockHeight);
//housingBody(10,false,true);
//translate([0,50,0])housingBody(10,true);


echo(version=version());
